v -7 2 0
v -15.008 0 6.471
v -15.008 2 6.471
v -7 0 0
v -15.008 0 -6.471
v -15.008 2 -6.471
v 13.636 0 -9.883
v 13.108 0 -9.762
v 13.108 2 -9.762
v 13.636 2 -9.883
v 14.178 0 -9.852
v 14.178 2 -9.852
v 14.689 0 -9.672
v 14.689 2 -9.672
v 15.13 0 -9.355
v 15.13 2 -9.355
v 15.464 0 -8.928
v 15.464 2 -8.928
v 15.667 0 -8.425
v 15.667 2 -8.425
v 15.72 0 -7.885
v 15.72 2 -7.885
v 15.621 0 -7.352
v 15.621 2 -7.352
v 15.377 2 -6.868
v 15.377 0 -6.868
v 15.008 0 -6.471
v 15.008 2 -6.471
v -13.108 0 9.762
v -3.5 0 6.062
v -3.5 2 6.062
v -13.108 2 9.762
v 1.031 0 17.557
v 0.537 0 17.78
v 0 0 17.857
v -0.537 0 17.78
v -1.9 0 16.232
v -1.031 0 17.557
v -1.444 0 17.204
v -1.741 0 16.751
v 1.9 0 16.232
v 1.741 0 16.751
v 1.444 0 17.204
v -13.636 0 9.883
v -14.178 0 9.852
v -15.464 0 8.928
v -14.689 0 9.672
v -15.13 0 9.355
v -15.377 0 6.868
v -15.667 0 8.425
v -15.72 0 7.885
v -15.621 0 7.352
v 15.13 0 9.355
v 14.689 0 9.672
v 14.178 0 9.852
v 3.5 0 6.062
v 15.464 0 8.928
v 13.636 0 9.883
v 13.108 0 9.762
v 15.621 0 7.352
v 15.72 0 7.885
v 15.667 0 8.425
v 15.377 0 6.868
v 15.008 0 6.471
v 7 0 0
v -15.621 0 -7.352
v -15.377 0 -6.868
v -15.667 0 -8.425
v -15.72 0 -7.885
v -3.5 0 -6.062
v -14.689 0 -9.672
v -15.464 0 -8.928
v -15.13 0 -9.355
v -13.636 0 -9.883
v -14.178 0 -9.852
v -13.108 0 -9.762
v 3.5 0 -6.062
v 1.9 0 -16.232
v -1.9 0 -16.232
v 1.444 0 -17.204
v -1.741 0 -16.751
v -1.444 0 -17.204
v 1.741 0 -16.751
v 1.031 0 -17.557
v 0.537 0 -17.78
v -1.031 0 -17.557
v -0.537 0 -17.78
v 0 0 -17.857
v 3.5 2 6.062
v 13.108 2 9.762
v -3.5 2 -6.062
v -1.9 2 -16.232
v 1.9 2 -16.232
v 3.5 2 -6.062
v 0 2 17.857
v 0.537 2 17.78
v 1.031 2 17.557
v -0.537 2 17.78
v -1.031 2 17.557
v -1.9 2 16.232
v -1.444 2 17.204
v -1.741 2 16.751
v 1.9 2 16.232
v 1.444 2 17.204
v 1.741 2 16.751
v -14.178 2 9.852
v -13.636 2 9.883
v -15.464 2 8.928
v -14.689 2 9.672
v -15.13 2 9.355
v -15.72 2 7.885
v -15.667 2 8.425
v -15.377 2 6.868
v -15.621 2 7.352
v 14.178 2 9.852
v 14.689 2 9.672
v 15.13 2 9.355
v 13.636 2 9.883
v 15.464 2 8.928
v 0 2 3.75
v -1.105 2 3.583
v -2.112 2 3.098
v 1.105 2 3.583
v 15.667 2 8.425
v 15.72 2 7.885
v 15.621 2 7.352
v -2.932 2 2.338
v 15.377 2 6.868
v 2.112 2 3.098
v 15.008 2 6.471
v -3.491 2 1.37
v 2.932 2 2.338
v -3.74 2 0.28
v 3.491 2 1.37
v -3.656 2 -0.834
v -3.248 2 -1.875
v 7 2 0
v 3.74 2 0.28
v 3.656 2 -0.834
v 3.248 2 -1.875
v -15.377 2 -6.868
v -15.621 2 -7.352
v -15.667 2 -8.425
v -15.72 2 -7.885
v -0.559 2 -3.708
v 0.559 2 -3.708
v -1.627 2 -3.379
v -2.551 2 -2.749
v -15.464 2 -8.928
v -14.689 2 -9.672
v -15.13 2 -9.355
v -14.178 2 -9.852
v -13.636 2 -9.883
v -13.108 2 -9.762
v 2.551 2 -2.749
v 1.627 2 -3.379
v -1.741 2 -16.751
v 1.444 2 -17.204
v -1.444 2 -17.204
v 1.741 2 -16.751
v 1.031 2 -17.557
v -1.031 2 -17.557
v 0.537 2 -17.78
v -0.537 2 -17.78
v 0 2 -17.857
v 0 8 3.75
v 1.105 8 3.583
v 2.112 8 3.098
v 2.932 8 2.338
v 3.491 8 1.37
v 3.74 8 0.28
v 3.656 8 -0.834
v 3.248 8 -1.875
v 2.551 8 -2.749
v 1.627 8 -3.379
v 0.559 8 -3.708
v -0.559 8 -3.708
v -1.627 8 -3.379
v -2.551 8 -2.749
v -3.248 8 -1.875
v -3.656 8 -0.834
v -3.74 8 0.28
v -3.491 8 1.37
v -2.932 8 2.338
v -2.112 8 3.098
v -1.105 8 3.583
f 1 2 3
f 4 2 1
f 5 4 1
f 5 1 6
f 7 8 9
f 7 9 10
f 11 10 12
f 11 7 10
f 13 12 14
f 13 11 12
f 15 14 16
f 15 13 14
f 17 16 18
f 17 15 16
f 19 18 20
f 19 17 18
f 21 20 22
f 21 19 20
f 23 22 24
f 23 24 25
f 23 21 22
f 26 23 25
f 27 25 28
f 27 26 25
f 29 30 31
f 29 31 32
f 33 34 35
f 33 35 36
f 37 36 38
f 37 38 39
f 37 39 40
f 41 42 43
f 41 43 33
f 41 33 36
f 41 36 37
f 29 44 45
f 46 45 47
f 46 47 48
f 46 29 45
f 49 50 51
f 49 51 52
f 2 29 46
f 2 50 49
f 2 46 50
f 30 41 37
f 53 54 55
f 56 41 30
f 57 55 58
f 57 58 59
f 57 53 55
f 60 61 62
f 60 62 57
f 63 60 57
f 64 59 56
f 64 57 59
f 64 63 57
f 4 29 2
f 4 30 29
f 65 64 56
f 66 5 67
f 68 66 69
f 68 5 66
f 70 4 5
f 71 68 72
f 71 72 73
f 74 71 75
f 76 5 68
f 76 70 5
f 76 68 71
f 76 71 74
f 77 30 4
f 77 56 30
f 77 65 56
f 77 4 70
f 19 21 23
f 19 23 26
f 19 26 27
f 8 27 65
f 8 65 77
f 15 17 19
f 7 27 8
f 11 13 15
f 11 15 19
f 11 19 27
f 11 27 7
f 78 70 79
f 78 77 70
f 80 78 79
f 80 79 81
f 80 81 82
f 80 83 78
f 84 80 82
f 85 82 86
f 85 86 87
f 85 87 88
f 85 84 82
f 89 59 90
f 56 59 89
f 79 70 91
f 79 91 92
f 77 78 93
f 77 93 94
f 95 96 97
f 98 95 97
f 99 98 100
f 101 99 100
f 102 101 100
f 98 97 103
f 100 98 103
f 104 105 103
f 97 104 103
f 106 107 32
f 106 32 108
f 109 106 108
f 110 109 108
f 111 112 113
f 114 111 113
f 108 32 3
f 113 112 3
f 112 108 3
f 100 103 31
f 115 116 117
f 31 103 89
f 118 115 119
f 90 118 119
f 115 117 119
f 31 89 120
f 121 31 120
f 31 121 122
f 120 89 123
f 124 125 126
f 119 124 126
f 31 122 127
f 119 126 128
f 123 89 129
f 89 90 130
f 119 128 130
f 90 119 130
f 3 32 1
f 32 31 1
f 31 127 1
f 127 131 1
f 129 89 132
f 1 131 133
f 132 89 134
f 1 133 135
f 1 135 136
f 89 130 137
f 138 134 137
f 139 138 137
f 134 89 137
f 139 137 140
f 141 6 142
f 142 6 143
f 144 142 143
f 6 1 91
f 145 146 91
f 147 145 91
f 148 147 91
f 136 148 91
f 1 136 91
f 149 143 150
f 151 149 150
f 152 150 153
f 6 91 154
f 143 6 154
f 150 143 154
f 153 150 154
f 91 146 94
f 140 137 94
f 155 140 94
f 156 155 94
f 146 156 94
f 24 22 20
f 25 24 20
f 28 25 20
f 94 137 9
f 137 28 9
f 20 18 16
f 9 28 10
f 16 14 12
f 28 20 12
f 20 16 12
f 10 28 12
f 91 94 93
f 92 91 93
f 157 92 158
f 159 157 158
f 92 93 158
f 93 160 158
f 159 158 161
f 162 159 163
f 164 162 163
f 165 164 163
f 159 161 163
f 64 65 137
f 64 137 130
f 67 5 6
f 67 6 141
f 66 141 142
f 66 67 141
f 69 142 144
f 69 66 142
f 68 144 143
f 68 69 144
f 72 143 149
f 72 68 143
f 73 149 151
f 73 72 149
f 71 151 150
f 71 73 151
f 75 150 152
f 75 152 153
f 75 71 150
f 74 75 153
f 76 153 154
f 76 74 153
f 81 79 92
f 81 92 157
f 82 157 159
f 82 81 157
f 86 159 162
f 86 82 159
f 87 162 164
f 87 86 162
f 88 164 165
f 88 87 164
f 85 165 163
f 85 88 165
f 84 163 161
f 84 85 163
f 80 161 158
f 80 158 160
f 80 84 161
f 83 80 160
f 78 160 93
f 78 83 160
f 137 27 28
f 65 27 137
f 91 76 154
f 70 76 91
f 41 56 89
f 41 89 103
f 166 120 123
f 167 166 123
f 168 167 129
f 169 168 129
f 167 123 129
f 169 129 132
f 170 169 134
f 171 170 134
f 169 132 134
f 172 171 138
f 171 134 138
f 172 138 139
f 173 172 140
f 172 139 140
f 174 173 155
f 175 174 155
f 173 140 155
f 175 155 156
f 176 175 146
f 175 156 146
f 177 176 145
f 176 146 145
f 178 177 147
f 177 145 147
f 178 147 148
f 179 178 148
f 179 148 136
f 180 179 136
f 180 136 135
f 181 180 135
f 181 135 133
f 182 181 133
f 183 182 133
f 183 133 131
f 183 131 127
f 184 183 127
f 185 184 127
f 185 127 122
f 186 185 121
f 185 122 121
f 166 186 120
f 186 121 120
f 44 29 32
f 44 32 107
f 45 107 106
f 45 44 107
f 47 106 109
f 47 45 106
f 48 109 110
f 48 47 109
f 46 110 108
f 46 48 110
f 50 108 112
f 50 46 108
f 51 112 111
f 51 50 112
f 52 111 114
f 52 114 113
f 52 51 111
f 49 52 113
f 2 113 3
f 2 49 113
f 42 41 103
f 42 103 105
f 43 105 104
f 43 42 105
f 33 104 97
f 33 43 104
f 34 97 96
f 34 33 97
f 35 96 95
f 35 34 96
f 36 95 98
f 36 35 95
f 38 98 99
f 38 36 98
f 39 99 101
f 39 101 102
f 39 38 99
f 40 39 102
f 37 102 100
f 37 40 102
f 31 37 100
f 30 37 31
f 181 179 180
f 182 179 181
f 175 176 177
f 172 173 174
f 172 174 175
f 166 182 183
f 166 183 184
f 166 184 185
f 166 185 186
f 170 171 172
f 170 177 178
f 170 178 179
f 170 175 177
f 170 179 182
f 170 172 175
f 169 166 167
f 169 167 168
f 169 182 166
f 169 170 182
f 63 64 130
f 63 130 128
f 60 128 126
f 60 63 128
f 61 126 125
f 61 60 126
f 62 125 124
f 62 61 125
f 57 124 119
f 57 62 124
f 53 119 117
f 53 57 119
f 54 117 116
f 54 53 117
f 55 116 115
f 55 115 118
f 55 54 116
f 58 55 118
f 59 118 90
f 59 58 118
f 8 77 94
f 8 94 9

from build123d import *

# Parameters (mm, degrees)
SKETCH1_R           = 7
BOSS_EXTRUDE1_DEPTH = 2
BOSS_EXTRUDE2_START = -2
BOSS_EXTRUDE2_DEPTH = 2
CIRPATTERN1_COUNT   = 6
SKETCH3_R           = 3.75
BOSS_EXTRUDE3_DEPTH = 6


with BuildPart() as part:
    # Sketch1 → Boss-Extrude1 (new body)
    with BuildSketch(Plane(origin=(0, 0, 0), x_dir=(1, 0, 0), z_dir=(0, 1, 0))):
        with Locations(Location((0, 0, 0), (0, 0, 270))):
            Circle(SKETCH1_R)
    extrude(amount=BOSS_EXTRUDE1_DEPTH)

    # Sketch2 → Boss-Extrude2 (add)
    with BuildSketch(Plane(origin=(0, 2, 0), x_dir=(1, 0, 0), z_dir=(0, 1, 0)).offset(BOSS_EXTRUDE2_START)):
        with BuildLine():
            Line((-3.5, 6.062177826), (-1.9, 16.23236311))
            ThreePointArc((-1.9, 16.23236311), (0, 17.856819334), (1.9, 16.23236311))
            Line((1.9, 16.23236311), (3.5, 6.062177826))
            ThreePointArc((3.5, 6.062177826), (0, 7), (-3.5, 6.062177826))
        make_face()
    boss_extrude2 = extrude(amount=BOSS_EXTRUDE2_DEPTH)

    # CirPattern1: Boss-Extrude2 ×6 about axis
    cirpattern1_axis = Axis((0, 0, 0), (0, 1, 0))
    for i in range(1, CIRPATTERN1_COUNT):
        add(boss_extrude2.rotate(cirpattern1_axis, i * 360 / CIRPATTERN1_COUNT))

    # Sketch3 → Boss-Extrude3 (add)
    with BuildSketch(Plane(origin=(0, 2, 0), x_dir=(1, 0, 0), z_dir=(0, 1, 0))):
        with Locations(Location((0, 0, 0), (0, 0, 270))):
            Circle(SKETCH3_R)
    extrude(amount=BOSS_EXTRUDE3_DEPTH)


solid = part.part
